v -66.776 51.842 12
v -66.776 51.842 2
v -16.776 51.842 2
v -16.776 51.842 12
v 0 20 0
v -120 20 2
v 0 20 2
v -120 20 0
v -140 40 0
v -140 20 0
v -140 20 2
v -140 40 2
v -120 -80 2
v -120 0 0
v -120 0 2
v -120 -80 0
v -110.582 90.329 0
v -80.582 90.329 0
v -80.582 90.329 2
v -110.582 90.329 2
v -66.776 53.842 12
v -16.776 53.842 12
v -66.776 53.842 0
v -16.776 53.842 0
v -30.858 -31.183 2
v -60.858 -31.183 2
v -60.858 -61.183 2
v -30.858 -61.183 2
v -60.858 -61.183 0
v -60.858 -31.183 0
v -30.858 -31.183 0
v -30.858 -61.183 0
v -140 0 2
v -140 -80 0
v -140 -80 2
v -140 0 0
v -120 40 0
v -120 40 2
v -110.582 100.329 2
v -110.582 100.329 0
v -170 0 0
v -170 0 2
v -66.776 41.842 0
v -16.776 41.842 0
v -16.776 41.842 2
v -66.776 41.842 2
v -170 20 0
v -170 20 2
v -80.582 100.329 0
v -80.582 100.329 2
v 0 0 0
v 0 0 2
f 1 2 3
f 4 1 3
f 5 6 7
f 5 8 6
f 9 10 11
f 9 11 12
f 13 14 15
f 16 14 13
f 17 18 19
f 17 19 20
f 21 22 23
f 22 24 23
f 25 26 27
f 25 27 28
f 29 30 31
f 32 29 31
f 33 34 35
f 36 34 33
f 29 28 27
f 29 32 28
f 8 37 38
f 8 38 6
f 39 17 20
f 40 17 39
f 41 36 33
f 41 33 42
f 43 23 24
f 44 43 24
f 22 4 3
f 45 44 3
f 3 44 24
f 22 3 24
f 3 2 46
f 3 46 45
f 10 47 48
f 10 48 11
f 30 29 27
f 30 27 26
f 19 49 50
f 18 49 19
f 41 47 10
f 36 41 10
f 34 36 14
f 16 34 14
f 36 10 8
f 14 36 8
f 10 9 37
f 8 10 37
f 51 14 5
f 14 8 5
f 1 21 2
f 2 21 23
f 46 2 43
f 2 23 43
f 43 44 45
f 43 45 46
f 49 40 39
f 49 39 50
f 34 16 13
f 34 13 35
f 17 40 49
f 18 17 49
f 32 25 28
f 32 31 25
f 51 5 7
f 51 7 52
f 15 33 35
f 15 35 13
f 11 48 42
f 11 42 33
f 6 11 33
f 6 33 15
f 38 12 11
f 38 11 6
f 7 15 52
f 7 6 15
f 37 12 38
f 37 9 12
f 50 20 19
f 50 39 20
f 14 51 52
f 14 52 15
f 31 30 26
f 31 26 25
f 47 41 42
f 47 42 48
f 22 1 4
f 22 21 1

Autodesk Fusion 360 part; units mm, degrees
sketch "Sketch1" plane through (0, 0, 0) normal (0, 0, 1) x (1, 0, 0)
  line L0 (0, 0) -> (-170, 0)
  line L1 (-170, 0) -> (-170, 20)
  line L2 (-170, 20) -> (0, 20)
  line L3 (0, 20) -> (0, 0)
  line L4 (-140, 40) -> (-120, 40)
  line L5 (-120, 40) -> (-120, -80)
  line L6 (-120, -80) -> (-140, -80)
  line L7 (-140, -80) -> (-140, 40)
  line L8 (-66.7762, 51.8423) -> (-16.7762, 51.8423)
  line L9 (-16.7762, 51.8423) -> (-16.7762, 41.8423)
  line L10 (-16.7762, 41.8423) -> (-66.7762, 41.8423)
  line L11 (-66.7762, 41.8423) -> (-66.7762, 51.8423)
  line L12 (-66.7762, 51.8423) -> (-16.7762, 51.8423)
  line L13 (-16.7762, 51.8423) -> (-16.7762, 53.8423)
  line L14 (-16.7762, 53.8423) -> (-66.7762, 53.8423)
  line L15 (-66.7762, 53.8423) -> (-66.7762, 51.8423)
  dimension "d1" = 170
  dimension "d2" = 20
  dimension "d3" = 20
  dimension "d4" = 120
  dimension "d5" = 20
  dimension "d6" = 30
  dimension "d7" = 50
  dimension "d8" = 10
  dimension "d9" = 2
extrude "Extrude1" add sketch "Sketch1" along normal blind 12 contours L8 L12 L13 L14 L15 makes body 1
extrude "Extrude2" add sketch "Sketch1" along normal blind 2 contours L8 L9 L10 L11 L12 bodies 1
extrude "Extrude3" add sketch "Sketch1" along normal blind 2 separate body contours L0 L2 L3 L5 | L0 L5 L6 L7 | L0 L2 L5 L7 | L0 L1 L2 L7 | L2 L4 L5 L7 makes body 2
sketch "Sketch2" plane through (0, 0, 0) normal (0, 0, 1) x (1, 0, 0)
  line L0 (-60.8582, -31.183) -> (-30.8582, -31.183)
  line L1 (-30.8582, -31.183) -> (-30.8582, -61.183)
  line L2 (-30.8582, -61.183) -> (-60.8582, -61.183)
  line L3 (-60.8582, -61.183) -> (-60.8582, -31.183)
  dimension "d16" = 30
  dimension "d17" = 30
extrude "Extrude4" add sketch "Sketch2" along normal blind 2 separate body makes body 3
sketch "Sketch3" plane through (0, 0, 0) normal (0, 0, 1) x (1, 0, 0)
  line L0 (-110.5818, 100.3288) -> (-80.5818, 100.3288)
  line L1 (-80.5818, 100.3288) -> (-80.5818, 90.3288)
  line L2 (-80.5818, 90.3288) -> (-110.5818, 90.3288)
  line L3 (-110.5818, 90.3288) -> (-110.5818, 100.3288)
  dimension "d20" = 30
  dimension "d21" = 10
extrude "Extrude5" add sketch "Sketch3" along normal blind 2 separate body makes body 4
